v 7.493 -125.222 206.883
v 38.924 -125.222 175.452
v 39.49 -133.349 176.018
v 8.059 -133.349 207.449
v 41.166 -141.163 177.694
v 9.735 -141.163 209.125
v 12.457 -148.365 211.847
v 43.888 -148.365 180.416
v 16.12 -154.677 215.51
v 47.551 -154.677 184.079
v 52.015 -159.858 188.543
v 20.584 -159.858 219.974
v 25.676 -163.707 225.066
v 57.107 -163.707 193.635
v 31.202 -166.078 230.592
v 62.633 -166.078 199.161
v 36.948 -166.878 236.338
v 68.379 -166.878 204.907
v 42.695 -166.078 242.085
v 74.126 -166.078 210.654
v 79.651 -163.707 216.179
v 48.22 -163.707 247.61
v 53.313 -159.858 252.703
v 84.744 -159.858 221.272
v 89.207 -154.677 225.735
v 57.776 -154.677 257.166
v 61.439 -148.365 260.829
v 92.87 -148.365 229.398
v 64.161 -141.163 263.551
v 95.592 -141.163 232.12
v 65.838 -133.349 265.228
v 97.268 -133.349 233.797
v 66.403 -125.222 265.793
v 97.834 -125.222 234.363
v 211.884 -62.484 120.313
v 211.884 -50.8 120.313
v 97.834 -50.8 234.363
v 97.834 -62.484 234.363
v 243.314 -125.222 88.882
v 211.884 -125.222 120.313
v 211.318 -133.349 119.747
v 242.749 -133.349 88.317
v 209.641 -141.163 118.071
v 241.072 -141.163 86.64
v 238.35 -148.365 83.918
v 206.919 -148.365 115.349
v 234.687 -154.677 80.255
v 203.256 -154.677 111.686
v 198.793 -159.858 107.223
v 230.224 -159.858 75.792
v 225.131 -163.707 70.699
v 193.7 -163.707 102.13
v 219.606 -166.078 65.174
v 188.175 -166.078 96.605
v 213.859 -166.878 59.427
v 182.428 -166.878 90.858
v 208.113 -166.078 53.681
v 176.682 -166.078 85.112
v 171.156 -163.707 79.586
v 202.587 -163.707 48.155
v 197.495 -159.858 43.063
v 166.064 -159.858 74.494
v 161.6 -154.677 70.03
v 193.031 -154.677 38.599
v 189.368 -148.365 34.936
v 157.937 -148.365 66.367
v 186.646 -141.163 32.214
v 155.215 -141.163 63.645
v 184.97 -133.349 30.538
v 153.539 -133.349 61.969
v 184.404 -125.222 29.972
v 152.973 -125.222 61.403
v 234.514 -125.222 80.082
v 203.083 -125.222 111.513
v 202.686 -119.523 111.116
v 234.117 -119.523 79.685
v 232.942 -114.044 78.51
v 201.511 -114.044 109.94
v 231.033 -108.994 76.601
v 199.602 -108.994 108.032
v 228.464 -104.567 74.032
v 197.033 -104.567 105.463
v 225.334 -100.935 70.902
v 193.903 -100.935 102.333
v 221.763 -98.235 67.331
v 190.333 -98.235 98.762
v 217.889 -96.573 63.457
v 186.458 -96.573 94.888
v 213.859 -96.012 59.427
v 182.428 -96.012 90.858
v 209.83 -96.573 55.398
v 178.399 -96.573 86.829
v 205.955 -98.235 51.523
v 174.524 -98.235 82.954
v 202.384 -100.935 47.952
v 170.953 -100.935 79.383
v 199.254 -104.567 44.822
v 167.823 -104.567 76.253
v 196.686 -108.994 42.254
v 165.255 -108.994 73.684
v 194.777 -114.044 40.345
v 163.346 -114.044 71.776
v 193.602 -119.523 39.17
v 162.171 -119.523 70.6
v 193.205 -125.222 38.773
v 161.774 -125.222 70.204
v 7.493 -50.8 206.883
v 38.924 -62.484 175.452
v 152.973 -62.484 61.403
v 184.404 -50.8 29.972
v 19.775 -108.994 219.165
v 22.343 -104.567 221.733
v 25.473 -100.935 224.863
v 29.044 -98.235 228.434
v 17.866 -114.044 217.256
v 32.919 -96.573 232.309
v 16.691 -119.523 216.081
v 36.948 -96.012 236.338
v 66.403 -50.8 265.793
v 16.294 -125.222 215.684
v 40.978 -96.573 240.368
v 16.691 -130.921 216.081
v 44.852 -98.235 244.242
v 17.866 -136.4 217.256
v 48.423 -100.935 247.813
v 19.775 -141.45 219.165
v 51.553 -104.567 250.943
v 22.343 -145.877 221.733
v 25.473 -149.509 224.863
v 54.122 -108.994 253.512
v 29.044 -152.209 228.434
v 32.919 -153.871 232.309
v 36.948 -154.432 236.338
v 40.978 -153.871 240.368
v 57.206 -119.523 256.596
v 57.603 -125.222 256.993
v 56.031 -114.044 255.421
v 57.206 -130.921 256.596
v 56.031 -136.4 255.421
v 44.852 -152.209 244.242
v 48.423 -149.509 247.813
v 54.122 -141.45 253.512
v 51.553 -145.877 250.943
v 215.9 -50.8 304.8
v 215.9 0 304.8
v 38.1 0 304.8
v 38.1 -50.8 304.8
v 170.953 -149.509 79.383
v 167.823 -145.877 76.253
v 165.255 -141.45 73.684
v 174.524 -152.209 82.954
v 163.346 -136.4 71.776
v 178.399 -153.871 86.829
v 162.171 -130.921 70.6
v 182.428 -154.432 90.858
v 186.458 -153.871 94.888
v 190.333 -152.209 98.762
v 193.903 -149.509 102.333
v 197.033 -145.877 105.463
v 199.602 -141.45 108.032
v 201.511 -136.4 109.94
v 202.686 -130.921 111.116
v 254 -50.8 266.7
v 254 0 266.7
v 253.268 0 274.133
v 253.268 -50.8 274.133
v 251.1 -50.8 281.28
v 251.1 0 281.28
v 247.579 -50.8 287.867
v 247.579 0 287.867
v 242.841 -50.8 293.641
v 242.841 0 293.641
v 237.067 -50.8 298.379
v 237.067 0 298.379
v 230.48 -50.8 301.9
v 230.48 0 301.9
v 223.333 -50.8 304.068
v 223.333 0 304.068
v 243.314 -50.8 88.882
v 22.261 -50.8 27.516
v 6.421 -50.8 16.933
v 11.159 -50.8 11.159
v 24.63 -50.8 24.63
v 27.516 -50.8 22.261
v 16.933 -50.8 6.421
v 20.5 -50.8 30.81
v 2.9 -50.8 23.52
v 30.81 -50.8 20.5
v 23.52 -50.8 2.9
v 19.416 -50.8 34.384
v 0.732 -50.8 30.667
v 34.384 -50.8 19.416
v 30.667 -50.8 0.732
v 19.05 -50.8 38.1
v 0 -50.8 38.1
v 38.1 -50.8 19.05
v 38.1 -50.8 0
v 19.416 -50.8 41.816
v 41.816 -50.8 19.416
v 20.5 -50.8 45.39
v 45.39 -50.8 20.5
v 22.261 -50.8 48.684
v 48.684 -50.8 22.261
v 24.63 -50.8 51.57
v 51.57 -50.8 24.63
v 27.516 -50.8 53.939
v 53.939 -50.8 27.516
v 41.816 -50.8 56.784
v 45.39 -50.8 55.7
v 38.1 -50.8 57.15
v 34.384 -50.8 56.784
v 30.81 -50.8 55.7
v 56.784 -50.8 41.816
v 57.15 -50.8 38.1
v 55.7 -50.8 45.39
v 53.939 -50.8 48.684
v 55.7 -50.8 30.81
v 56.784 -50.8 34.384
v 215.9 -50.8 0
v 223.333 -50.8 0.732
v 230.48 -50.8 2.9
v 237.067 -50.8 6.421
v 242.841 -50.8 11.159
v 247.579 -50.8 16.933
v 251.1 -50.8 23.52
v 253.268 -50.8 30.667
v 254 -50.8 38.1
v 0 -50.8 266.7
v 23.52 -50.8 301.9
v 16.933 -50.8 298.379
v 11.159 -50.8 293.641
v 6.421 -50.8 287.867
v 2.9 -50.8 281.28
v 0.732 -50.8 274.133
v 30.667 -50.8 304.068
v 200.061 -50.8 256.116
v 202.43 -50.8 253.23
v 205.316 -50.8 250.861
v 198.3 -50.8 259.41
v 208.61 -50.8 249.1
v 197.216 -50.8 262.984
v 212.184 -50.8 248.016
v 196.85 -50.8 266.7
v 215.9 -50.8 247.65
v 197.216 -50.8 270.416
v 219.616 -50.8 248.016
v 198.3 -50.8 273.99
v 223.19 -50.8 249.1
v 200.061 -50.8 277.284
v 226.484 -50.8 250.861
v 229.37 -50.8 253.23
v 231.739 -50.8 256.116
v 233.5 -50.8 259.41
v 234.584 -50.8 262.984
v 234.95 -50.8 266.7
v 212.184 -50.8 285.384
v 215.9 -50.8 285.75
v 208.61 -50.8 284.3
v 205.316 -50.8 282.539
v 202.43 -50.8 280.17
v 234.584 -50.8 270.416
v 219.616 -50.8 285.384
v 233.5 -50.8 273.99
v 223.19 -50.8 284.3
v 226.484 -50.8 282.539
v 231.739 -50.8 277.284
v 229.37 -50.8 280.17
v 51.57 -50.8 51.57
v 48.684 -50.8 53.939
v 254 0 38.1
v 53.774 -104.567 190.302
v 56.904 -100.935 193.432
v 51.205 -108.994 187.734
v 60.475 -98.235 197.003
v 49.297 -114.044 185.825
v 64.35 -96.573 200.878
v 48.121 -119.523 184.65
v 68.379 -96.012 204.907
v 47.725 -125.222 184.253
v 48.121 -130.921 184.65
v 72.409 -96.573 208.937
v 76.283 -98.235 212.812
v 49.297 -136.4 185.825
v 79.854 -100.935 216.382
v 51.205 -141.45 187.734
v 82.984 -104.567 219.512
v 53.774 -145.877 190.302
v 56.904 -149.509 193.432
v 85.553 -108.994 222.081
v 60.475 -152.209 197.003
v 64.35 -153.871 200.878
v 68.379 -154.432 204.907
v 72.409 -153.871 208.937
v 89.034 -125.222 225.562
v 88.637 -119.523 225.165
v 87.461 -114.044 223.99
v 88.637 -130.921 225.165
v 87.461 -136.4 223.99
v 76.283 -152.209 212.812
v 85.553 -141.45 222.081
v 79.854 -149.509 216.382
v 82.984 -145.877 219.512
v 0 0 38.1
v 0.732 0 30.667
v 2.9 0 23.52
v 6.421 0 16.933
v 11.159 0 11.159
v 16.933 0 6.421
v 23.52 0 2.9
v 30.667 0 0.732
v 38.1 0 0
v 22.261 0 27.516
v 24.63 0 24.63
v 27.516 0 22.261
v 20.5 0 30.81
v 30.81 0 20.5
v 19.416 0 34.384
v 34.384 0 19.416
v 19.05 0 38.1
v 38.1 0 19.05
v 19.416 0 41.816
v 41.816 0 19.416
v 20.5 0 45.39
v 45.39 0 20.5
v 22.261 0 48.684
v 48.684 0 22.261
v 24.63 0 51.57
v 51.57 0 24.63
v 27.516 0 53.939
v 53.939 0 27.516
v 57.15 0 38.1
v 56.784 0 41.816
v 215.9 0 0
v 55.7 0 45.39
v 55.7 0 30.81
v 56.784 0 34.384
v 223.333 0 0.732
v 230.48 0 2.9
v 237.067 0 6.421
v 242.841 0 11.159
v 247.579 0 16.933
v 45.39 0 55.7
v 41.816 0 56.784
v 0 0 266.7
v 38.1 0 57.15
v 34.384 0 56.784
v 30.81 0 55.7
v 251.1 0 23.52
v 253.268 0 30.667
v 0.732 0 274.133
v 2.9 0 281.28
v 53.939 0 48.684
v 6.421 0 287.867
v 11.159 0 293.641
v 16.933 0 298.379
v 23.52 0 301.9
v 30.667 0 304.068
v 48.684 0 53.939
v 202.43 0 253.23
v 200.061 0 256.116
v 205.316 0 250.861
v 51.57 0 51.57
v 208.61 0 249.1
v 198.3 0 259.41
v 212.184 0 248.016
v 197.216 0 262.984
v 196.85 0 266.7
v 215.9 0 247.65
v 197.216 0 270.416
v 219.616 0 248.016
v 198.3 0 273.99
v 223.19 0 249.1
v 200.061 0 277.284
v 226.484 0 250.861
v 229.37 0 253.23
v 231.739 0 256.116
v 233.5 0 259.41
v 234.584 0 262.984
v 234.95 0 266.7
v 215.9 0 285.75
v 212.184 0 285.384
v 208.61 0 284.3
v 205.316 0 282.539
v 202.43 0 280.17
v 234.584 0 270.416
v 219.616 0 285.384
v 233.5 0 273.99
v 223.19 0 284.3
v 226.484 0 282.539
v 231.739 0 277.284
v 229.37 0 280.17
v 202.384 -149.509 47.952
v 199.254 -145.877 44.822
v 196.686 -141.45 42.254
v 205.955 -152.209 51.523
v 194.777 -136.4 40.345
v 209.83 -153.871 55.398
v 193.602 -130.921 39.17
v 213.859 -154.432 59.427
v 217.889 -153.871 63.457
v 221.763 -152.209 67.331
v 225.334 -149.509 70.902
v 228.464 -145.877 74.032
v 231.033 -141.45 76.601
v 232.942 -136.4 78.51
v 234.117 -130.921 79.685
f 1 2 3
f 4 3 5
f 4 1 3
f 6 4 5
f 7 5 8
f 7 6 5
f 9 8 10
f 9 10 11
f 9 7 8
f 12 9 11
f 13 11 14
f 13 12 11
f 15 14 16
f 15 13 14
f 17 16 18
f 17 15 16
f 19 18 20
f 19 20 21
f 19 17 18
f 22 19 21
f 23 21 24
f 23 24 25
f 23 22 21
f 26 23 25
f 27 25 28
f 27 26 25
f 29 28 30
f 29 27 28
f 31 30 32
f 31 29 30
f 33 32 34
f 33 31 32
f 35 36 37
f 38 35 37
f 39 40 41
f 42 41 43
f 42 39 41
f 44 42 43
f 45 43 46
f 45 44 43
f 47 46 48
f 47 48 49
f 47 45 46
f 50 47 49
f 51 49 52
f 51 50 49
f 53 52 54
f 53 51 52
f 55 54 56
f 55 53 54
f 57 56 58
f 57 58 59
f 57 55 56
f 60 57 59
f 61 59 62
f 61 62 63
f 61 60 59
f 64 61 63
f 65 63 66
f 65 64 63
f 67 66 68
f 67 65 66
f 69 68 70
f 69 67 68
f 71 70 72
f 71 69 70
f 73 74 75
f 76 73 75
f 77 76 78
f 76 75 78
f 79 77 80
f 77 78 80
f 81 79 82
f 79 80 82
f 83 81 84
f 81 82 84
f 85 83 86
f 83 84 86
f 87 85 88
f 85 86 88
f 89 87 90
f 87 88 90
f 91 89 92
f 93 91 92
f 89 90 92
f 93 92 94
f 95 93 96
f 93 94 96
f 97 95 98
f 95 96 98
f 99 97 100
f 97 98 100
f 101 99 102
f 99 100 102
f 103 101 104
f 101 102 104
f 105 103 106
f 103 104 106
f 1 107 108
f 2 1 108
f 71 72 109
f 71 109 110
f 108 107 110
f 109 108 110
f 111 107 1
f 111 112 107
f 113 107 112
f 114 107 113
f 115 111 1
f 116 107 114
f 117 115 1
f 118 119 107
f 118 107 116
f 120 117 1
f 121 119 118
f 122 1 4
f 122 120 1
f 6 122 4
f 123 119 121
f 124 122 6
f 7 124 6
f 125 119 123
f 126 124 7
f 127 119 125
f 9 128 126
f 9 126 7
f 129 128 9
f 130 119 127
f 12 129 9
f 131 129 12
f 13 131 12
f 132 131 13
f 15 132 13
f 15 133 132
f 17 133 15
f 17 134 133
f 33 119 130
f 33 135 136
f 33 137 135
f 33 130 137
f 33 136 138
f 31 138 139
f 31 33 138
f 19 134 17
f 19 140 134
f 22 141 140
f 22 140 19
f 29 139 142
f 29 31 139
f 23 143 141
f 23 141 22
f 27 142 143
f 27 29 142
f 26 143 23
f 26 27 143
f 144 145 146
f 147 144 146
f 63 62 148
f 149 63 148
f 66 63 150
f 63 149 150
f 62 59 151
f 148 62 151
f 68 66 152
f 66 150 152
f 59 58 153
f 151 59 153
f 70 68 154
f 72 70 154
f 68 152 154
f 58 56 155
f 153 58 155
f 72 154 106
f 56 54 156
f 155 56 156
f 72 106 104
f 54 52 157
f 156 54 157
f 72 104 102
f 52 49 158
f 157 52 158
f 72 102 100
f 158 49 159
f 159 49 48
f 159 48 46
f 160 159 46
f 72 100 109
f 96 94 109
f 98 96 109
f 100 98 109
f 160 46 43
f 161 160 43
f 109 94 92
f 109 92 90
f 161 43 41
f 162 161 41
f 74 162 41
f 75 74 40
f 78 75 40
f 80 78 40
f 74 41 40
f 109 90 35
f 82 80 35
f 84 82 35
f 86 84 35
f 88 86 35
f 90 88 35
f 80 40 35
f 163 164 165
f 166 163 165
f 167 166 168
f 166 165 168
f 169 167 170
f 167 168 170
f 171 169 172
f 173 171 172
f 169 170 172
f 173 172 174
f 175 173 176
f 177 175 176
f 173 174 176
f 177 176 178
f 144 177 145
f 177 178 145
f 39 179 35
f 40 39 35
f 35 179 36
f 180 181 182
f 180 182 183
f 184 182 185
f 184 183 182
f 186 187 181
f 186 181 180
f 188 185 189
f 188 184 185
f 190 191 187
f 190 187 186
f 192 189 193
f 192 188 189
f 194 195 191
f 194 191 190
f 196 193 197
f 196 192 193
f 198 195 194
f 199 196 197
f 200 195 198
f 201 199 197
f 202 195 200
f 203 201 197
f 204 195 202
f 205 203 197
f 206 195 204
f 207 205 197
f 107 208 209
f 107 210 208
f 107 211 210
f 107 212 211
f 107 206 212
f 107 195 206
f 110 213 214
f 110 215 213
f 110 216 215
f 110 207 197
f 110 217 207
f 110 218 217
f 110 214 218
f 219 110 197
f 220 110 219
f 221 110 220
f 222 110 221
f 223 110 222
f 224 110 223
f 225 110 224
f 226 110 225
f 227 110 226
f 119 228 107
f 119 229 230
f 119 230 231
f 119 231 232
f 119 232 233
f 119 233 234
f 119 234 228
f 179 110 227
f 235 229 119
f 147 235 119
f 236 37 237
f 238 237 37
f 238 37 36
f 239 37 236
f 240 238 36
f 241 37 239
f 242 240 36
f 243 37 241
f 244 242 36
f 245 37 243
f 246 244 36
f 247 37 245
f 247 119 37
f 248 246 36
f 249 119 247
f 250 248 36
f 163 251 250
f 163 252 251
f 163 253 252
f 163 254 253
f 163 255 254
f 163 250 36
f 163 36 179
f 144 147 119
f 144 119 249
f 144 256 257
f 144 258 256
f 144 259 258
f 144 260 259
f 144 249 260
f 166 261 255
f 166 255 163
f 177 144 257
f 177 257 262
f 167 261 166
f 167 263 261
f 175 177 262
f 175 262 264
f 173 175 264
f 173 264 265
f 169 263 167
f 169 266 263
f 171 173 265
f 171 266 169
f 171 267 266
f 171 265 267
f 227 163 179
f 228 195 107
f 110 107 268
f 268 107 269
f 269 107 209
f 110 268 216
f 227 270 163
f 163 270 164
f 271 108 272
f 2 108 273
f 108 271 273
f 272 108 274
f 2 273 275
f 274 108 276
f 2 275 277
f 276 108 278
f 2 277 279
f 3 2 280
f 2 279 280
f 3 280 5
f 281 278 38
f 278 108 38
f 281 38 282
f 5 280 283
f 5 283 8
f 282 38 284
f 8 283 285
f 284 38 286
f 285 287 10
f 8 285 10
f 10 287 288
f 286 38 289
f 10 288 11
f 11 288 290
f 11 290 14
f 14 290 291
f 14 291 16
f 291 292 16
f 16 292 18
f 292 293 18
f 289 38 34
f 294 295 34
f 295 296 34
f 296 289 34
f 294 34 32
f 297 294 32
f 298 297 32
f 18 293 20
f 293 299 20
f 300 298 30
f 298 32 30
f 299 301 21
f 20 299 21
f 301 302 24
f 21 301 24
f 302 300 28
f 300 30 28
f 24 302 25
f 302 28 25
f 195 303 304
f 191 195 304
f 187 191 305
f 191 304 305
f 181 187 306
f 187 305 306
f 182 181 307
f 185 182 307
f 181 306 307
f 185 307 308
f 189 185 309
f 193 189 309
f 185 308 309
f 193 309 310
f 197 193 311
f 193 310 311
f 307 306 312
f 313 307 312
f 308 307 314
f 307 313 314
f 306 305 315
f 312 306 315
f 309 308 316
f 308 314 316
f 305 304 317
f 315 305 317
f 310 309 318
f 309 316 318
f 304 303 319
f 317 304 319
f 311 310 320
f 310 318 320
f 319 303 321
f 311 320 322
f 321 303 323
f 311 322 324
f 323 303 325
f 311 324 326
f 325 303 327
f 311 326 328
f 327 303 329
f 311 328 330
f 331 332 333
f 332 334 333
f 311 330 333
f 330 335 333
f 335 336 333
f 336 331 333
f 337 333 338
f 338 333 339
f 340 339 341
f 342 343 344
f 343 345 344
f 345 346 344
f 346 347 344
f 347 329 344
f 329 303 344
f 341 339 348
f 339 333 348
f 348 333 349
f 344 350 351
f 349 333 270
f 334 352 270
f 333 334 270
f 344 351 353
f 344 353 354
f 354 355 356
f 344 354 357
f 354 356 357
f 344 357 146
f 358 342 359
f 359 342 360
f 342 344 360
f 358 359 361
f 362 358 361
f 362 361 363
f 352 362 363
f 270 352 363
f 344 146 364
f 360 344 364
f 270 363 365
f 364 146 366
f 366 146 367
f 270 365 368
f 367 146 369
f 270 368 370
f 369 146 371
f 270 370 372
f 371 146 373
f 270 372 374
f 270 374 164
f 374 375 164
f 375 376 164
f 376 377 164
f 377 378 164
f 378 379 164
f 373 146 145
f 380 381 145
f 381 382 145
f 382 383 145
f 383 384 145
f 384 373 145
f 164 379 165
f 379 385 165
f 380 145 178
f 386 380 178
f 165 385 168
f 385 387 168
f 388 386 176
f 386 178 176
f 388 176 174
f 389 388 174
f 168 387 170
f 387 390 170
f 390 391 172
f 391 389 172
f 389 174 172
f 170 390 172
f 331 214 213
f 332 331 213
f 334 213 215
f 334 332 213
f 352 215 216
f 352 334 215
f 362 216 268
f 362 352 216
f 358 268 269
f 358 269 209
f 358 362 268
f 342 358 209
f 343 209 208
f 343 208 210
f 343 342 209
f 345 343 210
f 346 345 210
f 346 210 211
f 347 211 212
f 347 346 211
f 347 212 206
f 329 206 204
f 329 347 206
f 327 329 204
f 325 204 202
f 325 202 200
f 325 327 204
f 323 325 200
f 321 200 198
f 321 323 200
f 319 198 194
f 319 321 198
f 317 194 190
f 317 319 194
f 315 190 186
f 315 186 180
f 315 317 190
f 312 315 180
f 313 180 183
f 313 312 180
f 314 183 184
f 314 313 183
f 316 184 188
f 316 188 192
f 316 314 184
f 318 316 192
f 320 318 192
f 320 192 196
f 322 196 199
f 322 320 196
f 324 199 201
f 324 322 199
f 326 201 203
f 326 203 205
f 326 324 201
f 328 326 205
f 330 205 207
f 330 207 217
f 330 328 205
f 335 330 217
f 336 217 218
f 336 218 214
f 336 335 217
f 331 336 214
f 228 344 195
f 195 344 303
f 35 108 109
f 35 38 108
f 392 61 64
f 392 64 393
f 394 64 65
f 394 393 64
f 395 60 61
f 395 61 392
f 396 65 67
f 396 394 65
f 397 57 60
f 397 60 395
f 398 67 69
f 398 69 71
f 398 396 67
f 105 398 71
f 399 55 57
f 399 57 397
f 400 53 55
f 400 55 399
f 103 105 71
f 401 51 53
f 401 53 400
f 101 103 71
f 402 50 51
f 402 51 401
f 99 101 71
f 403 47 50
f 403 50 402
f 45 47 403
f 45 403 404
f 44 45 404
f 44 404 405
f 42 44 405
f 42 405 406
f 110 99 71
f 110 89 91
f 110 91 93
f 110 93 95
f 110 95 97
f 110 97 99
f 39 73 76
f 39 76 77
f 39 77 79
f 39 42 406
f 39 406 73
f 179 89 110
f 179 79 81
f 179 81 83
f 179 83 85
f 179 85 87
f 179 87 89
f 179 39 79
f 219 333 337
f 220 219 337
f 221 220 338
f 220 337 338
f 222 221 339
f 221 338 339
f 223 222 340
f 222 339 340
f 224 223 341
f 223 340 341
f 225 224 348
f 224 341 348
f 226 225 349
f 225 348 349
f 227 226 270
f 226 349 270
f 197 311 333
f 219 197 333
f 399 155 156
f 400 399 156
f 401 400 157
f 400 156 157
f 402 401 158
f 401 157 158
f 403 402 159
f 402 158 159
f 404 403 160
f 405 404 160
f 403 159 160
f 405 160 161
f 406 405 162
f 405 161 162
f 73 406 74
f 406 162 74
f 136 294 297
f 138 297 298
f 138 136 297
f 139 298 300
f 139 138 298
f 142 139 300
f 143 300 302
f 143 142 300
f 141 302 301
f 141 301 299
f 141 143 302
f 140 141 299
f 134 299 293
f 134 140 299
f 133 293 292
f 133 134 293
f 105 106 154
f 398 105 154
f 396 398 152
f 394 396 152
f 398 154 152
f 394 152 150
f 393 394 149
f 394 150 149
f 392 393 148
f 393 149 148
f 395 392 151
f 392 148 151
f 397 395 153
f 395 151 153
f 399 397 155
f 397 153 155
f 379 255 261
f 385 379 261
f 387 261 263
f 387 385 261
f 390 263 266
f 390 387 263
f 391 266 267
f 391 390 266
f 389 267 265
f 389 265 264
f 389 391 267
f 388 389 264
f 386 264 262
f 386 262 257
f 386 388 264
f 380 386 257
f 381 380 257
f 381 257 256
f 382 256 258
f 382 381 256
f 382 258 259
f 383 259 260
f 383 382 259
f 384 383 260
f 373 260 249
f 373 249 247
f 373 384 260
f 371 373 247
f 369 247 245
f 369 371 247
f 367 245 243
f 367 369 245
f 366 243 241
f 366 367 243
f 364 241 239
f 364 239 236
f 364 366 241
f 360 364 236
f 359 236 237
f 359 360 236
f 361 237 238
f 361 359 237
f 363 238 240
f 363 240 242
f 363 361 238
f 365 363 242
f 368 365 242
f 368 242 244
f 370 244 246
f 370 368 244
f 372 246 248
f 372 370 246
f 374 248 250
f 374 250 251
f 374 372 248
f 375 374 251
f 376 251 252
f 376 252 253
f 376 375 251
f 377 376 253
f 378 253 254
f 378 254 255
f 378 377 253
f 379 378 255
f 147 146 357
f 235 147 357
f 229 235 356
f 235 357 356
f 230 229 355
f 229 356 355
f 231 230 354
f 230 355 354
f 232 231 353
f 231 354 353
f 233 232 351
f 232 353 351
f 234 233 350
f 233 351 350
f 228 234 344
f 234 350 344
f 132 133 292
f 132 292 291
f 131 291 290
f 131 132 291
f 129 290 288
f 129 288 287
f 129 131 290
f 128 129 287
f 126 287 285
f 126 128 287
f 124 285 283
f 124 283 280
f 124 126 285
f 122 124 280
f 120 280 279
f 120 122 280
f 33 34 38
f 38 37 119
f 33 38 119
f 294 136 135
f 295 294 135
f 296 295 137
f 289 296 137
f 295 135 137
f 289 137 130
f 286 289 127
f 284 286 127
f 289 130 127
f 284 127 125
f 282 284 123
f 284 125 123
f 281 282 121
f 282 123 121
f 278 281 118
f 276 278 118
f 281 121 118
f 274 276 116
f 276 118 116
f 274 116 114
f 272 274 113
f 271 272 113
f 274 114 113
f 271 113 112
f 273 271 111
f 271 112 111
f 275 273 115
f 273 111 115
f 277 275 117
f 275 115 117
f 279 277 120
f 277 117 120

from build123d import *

# Parameters (mm, degrees)
F0_R     = 19.05
F1_DEPTH = 50.8
F2_DEPTH = 62.484
F3_DEPTH = 125.222
F5_DEPTH = 44.45
F7_DEPTH = 44.45
F8_DEPTH = 299.212


with BuildPart() as f1:
    # F0 (on Front) → F1 (new body)
    with BuildSketch(Plane.XZ):
        with BuildLine():
            ThreePointArc((0, 38.1), (11.1592316368, 11.1592316368), (38.1, 0))
            Line((38.1, 0), (215.9, 0))
            ThreePointArc((215.9, 0), (242.8407683632, 11.1592316368), (254, 38.1))
            Line((254, 38.1), (254, 266.7))
            ThreePointArc((254, 266.7), (242.8407683632, 293.6407683632), (215.9, 304.8))
            Line((215.9, 304.8), (38.1, 304.8))
            ThreePointArc((38.1, 304.8), (11.1592316368, 293.6407683632), (0, 266.7))
            Line((0, 266.7), (0, 38.1))
        make_face()
        with Locations((38.1, 38.1)):
            Circle(F0_R, mode=Mode.SUBTRACT)
        Polygon((243.3144801542, 88.8824801542), (184.404, 29.972), (152.9731035763, 61.4028964237), (38.9238964237, 175.4521035763), (7.493, 206.883), (66.4034801542, 265.7934801542), (97.834376578, 234.3625837305), (211.8835837305, 120.313376578), align=None, mode=Mode.SUBTRACT)
        with Locations((215.9, 266.7)):
            Circle(F0_R, mode=Mode.SUBTRACT)
    extrude(amount=F1_DEPTH)

    # F0 (on Front) → F2 (join)
    with BuildSketch(Plane.XZ):
        Polygon((38.9238964237, 175.4521035763), (152.9731035763, 61.4028964237), (211.8835837305, 120.313376578), (97.834376578, 234.3625837305), align=None)
    extrude(amount=F2_DEPTH)

    # F0 (on Front) → F3 (join)
    with BuildSketch(Plane.XZ):
        Polygon((152.9731035763, 61.4028964237), (184.404, 29.972), (243.3144801542, 88.8824801542), (211.8835837305, 120.313376578), align=None)
        Polygon((7.493, 206.883), (38.9238964237, 175.4521035763), (97.834376578, 234.3625837305), (66.4034801542, 265.7934801542), align=None)
    extrude(amount=F3_DEPTH)

    # F4 (on face) → F5 (join)
    with BuildSketch(Plane(origin=(77.216, 0, -77.216), x_dir=(0, 1, 0), z_dir=(0.7071067812, 0, -0.7071067812))):
        with BuildLine():
            Line((-125.222, 151.5867233236), (-125.222, 234.8987233236))
            ThreePointArc((-125.222, 234.8987233236), (-166.878, 193.2427233236), (-125.222, 151.5867233236))
        make_face()
    extrude(amount=-F5_DEPTH)

    # F6 (on face) → F7 (join)
    with BuildSketch(Plane(origin=(-99.695, 0, 99.695), x_dir=(0, -1, 0), z_dir=(-0.7071067812, 0, 0.7071067812))):
        with BuildLine():
            Line((125.222, 164.0327233236), (125.222, 151.5867233236))
            ThreePointArc((125.222, 151.5867233236), (166.878, 193.2427233236), (125.222, 234.8987233236))
            Line((125.222, 234.8987233236), (125.222, 222.4527233236))
            ThreePointArc((125.222, 222.4527233236), (145.8765890785, 213.8973124021), (154.432, 193.2427233236))
            ThreePointArc((154.432, 193.2427233236), (145.8765890785, 172.5881342452), (125.222, 164.0327233236))
        make_face()
    extrude(amount=-F7_DEPTH)

    # F6 (on face) → F8 (cut)
    with BuildSketch(Plane(origin=(-99.695, 0, 99.695), x_dir=(0, -1, 0), z_dir=(-0.7071067812, 0, 0.7071067812))):
        with BuildLine():
            Line((125.222, 222.4527233236), (125.222, 164.0327233236))
            ThreePointArc((125.222, 164.0327233236), (145.8765890785, 172.5881342452), (154.432, 193.2427233236))
            ThreePointArc((154.432, 193.2427233236), (145.8765890785, 213.8973124021), (125.222, 222.4527233236))
        make_face()
        with BuildLine():
            ThreePointArc((125.222, 222.4527233236), (96.012, 193.2427233236), (125.222, 164.0327233236))
            Line((125.222, 164.0327233236), (125.222, 222.4527233236))
        make_face()
    extrude(amount=-F8_DEPTH, mode=Mode.SUBTRACT)


solid = f1.part
